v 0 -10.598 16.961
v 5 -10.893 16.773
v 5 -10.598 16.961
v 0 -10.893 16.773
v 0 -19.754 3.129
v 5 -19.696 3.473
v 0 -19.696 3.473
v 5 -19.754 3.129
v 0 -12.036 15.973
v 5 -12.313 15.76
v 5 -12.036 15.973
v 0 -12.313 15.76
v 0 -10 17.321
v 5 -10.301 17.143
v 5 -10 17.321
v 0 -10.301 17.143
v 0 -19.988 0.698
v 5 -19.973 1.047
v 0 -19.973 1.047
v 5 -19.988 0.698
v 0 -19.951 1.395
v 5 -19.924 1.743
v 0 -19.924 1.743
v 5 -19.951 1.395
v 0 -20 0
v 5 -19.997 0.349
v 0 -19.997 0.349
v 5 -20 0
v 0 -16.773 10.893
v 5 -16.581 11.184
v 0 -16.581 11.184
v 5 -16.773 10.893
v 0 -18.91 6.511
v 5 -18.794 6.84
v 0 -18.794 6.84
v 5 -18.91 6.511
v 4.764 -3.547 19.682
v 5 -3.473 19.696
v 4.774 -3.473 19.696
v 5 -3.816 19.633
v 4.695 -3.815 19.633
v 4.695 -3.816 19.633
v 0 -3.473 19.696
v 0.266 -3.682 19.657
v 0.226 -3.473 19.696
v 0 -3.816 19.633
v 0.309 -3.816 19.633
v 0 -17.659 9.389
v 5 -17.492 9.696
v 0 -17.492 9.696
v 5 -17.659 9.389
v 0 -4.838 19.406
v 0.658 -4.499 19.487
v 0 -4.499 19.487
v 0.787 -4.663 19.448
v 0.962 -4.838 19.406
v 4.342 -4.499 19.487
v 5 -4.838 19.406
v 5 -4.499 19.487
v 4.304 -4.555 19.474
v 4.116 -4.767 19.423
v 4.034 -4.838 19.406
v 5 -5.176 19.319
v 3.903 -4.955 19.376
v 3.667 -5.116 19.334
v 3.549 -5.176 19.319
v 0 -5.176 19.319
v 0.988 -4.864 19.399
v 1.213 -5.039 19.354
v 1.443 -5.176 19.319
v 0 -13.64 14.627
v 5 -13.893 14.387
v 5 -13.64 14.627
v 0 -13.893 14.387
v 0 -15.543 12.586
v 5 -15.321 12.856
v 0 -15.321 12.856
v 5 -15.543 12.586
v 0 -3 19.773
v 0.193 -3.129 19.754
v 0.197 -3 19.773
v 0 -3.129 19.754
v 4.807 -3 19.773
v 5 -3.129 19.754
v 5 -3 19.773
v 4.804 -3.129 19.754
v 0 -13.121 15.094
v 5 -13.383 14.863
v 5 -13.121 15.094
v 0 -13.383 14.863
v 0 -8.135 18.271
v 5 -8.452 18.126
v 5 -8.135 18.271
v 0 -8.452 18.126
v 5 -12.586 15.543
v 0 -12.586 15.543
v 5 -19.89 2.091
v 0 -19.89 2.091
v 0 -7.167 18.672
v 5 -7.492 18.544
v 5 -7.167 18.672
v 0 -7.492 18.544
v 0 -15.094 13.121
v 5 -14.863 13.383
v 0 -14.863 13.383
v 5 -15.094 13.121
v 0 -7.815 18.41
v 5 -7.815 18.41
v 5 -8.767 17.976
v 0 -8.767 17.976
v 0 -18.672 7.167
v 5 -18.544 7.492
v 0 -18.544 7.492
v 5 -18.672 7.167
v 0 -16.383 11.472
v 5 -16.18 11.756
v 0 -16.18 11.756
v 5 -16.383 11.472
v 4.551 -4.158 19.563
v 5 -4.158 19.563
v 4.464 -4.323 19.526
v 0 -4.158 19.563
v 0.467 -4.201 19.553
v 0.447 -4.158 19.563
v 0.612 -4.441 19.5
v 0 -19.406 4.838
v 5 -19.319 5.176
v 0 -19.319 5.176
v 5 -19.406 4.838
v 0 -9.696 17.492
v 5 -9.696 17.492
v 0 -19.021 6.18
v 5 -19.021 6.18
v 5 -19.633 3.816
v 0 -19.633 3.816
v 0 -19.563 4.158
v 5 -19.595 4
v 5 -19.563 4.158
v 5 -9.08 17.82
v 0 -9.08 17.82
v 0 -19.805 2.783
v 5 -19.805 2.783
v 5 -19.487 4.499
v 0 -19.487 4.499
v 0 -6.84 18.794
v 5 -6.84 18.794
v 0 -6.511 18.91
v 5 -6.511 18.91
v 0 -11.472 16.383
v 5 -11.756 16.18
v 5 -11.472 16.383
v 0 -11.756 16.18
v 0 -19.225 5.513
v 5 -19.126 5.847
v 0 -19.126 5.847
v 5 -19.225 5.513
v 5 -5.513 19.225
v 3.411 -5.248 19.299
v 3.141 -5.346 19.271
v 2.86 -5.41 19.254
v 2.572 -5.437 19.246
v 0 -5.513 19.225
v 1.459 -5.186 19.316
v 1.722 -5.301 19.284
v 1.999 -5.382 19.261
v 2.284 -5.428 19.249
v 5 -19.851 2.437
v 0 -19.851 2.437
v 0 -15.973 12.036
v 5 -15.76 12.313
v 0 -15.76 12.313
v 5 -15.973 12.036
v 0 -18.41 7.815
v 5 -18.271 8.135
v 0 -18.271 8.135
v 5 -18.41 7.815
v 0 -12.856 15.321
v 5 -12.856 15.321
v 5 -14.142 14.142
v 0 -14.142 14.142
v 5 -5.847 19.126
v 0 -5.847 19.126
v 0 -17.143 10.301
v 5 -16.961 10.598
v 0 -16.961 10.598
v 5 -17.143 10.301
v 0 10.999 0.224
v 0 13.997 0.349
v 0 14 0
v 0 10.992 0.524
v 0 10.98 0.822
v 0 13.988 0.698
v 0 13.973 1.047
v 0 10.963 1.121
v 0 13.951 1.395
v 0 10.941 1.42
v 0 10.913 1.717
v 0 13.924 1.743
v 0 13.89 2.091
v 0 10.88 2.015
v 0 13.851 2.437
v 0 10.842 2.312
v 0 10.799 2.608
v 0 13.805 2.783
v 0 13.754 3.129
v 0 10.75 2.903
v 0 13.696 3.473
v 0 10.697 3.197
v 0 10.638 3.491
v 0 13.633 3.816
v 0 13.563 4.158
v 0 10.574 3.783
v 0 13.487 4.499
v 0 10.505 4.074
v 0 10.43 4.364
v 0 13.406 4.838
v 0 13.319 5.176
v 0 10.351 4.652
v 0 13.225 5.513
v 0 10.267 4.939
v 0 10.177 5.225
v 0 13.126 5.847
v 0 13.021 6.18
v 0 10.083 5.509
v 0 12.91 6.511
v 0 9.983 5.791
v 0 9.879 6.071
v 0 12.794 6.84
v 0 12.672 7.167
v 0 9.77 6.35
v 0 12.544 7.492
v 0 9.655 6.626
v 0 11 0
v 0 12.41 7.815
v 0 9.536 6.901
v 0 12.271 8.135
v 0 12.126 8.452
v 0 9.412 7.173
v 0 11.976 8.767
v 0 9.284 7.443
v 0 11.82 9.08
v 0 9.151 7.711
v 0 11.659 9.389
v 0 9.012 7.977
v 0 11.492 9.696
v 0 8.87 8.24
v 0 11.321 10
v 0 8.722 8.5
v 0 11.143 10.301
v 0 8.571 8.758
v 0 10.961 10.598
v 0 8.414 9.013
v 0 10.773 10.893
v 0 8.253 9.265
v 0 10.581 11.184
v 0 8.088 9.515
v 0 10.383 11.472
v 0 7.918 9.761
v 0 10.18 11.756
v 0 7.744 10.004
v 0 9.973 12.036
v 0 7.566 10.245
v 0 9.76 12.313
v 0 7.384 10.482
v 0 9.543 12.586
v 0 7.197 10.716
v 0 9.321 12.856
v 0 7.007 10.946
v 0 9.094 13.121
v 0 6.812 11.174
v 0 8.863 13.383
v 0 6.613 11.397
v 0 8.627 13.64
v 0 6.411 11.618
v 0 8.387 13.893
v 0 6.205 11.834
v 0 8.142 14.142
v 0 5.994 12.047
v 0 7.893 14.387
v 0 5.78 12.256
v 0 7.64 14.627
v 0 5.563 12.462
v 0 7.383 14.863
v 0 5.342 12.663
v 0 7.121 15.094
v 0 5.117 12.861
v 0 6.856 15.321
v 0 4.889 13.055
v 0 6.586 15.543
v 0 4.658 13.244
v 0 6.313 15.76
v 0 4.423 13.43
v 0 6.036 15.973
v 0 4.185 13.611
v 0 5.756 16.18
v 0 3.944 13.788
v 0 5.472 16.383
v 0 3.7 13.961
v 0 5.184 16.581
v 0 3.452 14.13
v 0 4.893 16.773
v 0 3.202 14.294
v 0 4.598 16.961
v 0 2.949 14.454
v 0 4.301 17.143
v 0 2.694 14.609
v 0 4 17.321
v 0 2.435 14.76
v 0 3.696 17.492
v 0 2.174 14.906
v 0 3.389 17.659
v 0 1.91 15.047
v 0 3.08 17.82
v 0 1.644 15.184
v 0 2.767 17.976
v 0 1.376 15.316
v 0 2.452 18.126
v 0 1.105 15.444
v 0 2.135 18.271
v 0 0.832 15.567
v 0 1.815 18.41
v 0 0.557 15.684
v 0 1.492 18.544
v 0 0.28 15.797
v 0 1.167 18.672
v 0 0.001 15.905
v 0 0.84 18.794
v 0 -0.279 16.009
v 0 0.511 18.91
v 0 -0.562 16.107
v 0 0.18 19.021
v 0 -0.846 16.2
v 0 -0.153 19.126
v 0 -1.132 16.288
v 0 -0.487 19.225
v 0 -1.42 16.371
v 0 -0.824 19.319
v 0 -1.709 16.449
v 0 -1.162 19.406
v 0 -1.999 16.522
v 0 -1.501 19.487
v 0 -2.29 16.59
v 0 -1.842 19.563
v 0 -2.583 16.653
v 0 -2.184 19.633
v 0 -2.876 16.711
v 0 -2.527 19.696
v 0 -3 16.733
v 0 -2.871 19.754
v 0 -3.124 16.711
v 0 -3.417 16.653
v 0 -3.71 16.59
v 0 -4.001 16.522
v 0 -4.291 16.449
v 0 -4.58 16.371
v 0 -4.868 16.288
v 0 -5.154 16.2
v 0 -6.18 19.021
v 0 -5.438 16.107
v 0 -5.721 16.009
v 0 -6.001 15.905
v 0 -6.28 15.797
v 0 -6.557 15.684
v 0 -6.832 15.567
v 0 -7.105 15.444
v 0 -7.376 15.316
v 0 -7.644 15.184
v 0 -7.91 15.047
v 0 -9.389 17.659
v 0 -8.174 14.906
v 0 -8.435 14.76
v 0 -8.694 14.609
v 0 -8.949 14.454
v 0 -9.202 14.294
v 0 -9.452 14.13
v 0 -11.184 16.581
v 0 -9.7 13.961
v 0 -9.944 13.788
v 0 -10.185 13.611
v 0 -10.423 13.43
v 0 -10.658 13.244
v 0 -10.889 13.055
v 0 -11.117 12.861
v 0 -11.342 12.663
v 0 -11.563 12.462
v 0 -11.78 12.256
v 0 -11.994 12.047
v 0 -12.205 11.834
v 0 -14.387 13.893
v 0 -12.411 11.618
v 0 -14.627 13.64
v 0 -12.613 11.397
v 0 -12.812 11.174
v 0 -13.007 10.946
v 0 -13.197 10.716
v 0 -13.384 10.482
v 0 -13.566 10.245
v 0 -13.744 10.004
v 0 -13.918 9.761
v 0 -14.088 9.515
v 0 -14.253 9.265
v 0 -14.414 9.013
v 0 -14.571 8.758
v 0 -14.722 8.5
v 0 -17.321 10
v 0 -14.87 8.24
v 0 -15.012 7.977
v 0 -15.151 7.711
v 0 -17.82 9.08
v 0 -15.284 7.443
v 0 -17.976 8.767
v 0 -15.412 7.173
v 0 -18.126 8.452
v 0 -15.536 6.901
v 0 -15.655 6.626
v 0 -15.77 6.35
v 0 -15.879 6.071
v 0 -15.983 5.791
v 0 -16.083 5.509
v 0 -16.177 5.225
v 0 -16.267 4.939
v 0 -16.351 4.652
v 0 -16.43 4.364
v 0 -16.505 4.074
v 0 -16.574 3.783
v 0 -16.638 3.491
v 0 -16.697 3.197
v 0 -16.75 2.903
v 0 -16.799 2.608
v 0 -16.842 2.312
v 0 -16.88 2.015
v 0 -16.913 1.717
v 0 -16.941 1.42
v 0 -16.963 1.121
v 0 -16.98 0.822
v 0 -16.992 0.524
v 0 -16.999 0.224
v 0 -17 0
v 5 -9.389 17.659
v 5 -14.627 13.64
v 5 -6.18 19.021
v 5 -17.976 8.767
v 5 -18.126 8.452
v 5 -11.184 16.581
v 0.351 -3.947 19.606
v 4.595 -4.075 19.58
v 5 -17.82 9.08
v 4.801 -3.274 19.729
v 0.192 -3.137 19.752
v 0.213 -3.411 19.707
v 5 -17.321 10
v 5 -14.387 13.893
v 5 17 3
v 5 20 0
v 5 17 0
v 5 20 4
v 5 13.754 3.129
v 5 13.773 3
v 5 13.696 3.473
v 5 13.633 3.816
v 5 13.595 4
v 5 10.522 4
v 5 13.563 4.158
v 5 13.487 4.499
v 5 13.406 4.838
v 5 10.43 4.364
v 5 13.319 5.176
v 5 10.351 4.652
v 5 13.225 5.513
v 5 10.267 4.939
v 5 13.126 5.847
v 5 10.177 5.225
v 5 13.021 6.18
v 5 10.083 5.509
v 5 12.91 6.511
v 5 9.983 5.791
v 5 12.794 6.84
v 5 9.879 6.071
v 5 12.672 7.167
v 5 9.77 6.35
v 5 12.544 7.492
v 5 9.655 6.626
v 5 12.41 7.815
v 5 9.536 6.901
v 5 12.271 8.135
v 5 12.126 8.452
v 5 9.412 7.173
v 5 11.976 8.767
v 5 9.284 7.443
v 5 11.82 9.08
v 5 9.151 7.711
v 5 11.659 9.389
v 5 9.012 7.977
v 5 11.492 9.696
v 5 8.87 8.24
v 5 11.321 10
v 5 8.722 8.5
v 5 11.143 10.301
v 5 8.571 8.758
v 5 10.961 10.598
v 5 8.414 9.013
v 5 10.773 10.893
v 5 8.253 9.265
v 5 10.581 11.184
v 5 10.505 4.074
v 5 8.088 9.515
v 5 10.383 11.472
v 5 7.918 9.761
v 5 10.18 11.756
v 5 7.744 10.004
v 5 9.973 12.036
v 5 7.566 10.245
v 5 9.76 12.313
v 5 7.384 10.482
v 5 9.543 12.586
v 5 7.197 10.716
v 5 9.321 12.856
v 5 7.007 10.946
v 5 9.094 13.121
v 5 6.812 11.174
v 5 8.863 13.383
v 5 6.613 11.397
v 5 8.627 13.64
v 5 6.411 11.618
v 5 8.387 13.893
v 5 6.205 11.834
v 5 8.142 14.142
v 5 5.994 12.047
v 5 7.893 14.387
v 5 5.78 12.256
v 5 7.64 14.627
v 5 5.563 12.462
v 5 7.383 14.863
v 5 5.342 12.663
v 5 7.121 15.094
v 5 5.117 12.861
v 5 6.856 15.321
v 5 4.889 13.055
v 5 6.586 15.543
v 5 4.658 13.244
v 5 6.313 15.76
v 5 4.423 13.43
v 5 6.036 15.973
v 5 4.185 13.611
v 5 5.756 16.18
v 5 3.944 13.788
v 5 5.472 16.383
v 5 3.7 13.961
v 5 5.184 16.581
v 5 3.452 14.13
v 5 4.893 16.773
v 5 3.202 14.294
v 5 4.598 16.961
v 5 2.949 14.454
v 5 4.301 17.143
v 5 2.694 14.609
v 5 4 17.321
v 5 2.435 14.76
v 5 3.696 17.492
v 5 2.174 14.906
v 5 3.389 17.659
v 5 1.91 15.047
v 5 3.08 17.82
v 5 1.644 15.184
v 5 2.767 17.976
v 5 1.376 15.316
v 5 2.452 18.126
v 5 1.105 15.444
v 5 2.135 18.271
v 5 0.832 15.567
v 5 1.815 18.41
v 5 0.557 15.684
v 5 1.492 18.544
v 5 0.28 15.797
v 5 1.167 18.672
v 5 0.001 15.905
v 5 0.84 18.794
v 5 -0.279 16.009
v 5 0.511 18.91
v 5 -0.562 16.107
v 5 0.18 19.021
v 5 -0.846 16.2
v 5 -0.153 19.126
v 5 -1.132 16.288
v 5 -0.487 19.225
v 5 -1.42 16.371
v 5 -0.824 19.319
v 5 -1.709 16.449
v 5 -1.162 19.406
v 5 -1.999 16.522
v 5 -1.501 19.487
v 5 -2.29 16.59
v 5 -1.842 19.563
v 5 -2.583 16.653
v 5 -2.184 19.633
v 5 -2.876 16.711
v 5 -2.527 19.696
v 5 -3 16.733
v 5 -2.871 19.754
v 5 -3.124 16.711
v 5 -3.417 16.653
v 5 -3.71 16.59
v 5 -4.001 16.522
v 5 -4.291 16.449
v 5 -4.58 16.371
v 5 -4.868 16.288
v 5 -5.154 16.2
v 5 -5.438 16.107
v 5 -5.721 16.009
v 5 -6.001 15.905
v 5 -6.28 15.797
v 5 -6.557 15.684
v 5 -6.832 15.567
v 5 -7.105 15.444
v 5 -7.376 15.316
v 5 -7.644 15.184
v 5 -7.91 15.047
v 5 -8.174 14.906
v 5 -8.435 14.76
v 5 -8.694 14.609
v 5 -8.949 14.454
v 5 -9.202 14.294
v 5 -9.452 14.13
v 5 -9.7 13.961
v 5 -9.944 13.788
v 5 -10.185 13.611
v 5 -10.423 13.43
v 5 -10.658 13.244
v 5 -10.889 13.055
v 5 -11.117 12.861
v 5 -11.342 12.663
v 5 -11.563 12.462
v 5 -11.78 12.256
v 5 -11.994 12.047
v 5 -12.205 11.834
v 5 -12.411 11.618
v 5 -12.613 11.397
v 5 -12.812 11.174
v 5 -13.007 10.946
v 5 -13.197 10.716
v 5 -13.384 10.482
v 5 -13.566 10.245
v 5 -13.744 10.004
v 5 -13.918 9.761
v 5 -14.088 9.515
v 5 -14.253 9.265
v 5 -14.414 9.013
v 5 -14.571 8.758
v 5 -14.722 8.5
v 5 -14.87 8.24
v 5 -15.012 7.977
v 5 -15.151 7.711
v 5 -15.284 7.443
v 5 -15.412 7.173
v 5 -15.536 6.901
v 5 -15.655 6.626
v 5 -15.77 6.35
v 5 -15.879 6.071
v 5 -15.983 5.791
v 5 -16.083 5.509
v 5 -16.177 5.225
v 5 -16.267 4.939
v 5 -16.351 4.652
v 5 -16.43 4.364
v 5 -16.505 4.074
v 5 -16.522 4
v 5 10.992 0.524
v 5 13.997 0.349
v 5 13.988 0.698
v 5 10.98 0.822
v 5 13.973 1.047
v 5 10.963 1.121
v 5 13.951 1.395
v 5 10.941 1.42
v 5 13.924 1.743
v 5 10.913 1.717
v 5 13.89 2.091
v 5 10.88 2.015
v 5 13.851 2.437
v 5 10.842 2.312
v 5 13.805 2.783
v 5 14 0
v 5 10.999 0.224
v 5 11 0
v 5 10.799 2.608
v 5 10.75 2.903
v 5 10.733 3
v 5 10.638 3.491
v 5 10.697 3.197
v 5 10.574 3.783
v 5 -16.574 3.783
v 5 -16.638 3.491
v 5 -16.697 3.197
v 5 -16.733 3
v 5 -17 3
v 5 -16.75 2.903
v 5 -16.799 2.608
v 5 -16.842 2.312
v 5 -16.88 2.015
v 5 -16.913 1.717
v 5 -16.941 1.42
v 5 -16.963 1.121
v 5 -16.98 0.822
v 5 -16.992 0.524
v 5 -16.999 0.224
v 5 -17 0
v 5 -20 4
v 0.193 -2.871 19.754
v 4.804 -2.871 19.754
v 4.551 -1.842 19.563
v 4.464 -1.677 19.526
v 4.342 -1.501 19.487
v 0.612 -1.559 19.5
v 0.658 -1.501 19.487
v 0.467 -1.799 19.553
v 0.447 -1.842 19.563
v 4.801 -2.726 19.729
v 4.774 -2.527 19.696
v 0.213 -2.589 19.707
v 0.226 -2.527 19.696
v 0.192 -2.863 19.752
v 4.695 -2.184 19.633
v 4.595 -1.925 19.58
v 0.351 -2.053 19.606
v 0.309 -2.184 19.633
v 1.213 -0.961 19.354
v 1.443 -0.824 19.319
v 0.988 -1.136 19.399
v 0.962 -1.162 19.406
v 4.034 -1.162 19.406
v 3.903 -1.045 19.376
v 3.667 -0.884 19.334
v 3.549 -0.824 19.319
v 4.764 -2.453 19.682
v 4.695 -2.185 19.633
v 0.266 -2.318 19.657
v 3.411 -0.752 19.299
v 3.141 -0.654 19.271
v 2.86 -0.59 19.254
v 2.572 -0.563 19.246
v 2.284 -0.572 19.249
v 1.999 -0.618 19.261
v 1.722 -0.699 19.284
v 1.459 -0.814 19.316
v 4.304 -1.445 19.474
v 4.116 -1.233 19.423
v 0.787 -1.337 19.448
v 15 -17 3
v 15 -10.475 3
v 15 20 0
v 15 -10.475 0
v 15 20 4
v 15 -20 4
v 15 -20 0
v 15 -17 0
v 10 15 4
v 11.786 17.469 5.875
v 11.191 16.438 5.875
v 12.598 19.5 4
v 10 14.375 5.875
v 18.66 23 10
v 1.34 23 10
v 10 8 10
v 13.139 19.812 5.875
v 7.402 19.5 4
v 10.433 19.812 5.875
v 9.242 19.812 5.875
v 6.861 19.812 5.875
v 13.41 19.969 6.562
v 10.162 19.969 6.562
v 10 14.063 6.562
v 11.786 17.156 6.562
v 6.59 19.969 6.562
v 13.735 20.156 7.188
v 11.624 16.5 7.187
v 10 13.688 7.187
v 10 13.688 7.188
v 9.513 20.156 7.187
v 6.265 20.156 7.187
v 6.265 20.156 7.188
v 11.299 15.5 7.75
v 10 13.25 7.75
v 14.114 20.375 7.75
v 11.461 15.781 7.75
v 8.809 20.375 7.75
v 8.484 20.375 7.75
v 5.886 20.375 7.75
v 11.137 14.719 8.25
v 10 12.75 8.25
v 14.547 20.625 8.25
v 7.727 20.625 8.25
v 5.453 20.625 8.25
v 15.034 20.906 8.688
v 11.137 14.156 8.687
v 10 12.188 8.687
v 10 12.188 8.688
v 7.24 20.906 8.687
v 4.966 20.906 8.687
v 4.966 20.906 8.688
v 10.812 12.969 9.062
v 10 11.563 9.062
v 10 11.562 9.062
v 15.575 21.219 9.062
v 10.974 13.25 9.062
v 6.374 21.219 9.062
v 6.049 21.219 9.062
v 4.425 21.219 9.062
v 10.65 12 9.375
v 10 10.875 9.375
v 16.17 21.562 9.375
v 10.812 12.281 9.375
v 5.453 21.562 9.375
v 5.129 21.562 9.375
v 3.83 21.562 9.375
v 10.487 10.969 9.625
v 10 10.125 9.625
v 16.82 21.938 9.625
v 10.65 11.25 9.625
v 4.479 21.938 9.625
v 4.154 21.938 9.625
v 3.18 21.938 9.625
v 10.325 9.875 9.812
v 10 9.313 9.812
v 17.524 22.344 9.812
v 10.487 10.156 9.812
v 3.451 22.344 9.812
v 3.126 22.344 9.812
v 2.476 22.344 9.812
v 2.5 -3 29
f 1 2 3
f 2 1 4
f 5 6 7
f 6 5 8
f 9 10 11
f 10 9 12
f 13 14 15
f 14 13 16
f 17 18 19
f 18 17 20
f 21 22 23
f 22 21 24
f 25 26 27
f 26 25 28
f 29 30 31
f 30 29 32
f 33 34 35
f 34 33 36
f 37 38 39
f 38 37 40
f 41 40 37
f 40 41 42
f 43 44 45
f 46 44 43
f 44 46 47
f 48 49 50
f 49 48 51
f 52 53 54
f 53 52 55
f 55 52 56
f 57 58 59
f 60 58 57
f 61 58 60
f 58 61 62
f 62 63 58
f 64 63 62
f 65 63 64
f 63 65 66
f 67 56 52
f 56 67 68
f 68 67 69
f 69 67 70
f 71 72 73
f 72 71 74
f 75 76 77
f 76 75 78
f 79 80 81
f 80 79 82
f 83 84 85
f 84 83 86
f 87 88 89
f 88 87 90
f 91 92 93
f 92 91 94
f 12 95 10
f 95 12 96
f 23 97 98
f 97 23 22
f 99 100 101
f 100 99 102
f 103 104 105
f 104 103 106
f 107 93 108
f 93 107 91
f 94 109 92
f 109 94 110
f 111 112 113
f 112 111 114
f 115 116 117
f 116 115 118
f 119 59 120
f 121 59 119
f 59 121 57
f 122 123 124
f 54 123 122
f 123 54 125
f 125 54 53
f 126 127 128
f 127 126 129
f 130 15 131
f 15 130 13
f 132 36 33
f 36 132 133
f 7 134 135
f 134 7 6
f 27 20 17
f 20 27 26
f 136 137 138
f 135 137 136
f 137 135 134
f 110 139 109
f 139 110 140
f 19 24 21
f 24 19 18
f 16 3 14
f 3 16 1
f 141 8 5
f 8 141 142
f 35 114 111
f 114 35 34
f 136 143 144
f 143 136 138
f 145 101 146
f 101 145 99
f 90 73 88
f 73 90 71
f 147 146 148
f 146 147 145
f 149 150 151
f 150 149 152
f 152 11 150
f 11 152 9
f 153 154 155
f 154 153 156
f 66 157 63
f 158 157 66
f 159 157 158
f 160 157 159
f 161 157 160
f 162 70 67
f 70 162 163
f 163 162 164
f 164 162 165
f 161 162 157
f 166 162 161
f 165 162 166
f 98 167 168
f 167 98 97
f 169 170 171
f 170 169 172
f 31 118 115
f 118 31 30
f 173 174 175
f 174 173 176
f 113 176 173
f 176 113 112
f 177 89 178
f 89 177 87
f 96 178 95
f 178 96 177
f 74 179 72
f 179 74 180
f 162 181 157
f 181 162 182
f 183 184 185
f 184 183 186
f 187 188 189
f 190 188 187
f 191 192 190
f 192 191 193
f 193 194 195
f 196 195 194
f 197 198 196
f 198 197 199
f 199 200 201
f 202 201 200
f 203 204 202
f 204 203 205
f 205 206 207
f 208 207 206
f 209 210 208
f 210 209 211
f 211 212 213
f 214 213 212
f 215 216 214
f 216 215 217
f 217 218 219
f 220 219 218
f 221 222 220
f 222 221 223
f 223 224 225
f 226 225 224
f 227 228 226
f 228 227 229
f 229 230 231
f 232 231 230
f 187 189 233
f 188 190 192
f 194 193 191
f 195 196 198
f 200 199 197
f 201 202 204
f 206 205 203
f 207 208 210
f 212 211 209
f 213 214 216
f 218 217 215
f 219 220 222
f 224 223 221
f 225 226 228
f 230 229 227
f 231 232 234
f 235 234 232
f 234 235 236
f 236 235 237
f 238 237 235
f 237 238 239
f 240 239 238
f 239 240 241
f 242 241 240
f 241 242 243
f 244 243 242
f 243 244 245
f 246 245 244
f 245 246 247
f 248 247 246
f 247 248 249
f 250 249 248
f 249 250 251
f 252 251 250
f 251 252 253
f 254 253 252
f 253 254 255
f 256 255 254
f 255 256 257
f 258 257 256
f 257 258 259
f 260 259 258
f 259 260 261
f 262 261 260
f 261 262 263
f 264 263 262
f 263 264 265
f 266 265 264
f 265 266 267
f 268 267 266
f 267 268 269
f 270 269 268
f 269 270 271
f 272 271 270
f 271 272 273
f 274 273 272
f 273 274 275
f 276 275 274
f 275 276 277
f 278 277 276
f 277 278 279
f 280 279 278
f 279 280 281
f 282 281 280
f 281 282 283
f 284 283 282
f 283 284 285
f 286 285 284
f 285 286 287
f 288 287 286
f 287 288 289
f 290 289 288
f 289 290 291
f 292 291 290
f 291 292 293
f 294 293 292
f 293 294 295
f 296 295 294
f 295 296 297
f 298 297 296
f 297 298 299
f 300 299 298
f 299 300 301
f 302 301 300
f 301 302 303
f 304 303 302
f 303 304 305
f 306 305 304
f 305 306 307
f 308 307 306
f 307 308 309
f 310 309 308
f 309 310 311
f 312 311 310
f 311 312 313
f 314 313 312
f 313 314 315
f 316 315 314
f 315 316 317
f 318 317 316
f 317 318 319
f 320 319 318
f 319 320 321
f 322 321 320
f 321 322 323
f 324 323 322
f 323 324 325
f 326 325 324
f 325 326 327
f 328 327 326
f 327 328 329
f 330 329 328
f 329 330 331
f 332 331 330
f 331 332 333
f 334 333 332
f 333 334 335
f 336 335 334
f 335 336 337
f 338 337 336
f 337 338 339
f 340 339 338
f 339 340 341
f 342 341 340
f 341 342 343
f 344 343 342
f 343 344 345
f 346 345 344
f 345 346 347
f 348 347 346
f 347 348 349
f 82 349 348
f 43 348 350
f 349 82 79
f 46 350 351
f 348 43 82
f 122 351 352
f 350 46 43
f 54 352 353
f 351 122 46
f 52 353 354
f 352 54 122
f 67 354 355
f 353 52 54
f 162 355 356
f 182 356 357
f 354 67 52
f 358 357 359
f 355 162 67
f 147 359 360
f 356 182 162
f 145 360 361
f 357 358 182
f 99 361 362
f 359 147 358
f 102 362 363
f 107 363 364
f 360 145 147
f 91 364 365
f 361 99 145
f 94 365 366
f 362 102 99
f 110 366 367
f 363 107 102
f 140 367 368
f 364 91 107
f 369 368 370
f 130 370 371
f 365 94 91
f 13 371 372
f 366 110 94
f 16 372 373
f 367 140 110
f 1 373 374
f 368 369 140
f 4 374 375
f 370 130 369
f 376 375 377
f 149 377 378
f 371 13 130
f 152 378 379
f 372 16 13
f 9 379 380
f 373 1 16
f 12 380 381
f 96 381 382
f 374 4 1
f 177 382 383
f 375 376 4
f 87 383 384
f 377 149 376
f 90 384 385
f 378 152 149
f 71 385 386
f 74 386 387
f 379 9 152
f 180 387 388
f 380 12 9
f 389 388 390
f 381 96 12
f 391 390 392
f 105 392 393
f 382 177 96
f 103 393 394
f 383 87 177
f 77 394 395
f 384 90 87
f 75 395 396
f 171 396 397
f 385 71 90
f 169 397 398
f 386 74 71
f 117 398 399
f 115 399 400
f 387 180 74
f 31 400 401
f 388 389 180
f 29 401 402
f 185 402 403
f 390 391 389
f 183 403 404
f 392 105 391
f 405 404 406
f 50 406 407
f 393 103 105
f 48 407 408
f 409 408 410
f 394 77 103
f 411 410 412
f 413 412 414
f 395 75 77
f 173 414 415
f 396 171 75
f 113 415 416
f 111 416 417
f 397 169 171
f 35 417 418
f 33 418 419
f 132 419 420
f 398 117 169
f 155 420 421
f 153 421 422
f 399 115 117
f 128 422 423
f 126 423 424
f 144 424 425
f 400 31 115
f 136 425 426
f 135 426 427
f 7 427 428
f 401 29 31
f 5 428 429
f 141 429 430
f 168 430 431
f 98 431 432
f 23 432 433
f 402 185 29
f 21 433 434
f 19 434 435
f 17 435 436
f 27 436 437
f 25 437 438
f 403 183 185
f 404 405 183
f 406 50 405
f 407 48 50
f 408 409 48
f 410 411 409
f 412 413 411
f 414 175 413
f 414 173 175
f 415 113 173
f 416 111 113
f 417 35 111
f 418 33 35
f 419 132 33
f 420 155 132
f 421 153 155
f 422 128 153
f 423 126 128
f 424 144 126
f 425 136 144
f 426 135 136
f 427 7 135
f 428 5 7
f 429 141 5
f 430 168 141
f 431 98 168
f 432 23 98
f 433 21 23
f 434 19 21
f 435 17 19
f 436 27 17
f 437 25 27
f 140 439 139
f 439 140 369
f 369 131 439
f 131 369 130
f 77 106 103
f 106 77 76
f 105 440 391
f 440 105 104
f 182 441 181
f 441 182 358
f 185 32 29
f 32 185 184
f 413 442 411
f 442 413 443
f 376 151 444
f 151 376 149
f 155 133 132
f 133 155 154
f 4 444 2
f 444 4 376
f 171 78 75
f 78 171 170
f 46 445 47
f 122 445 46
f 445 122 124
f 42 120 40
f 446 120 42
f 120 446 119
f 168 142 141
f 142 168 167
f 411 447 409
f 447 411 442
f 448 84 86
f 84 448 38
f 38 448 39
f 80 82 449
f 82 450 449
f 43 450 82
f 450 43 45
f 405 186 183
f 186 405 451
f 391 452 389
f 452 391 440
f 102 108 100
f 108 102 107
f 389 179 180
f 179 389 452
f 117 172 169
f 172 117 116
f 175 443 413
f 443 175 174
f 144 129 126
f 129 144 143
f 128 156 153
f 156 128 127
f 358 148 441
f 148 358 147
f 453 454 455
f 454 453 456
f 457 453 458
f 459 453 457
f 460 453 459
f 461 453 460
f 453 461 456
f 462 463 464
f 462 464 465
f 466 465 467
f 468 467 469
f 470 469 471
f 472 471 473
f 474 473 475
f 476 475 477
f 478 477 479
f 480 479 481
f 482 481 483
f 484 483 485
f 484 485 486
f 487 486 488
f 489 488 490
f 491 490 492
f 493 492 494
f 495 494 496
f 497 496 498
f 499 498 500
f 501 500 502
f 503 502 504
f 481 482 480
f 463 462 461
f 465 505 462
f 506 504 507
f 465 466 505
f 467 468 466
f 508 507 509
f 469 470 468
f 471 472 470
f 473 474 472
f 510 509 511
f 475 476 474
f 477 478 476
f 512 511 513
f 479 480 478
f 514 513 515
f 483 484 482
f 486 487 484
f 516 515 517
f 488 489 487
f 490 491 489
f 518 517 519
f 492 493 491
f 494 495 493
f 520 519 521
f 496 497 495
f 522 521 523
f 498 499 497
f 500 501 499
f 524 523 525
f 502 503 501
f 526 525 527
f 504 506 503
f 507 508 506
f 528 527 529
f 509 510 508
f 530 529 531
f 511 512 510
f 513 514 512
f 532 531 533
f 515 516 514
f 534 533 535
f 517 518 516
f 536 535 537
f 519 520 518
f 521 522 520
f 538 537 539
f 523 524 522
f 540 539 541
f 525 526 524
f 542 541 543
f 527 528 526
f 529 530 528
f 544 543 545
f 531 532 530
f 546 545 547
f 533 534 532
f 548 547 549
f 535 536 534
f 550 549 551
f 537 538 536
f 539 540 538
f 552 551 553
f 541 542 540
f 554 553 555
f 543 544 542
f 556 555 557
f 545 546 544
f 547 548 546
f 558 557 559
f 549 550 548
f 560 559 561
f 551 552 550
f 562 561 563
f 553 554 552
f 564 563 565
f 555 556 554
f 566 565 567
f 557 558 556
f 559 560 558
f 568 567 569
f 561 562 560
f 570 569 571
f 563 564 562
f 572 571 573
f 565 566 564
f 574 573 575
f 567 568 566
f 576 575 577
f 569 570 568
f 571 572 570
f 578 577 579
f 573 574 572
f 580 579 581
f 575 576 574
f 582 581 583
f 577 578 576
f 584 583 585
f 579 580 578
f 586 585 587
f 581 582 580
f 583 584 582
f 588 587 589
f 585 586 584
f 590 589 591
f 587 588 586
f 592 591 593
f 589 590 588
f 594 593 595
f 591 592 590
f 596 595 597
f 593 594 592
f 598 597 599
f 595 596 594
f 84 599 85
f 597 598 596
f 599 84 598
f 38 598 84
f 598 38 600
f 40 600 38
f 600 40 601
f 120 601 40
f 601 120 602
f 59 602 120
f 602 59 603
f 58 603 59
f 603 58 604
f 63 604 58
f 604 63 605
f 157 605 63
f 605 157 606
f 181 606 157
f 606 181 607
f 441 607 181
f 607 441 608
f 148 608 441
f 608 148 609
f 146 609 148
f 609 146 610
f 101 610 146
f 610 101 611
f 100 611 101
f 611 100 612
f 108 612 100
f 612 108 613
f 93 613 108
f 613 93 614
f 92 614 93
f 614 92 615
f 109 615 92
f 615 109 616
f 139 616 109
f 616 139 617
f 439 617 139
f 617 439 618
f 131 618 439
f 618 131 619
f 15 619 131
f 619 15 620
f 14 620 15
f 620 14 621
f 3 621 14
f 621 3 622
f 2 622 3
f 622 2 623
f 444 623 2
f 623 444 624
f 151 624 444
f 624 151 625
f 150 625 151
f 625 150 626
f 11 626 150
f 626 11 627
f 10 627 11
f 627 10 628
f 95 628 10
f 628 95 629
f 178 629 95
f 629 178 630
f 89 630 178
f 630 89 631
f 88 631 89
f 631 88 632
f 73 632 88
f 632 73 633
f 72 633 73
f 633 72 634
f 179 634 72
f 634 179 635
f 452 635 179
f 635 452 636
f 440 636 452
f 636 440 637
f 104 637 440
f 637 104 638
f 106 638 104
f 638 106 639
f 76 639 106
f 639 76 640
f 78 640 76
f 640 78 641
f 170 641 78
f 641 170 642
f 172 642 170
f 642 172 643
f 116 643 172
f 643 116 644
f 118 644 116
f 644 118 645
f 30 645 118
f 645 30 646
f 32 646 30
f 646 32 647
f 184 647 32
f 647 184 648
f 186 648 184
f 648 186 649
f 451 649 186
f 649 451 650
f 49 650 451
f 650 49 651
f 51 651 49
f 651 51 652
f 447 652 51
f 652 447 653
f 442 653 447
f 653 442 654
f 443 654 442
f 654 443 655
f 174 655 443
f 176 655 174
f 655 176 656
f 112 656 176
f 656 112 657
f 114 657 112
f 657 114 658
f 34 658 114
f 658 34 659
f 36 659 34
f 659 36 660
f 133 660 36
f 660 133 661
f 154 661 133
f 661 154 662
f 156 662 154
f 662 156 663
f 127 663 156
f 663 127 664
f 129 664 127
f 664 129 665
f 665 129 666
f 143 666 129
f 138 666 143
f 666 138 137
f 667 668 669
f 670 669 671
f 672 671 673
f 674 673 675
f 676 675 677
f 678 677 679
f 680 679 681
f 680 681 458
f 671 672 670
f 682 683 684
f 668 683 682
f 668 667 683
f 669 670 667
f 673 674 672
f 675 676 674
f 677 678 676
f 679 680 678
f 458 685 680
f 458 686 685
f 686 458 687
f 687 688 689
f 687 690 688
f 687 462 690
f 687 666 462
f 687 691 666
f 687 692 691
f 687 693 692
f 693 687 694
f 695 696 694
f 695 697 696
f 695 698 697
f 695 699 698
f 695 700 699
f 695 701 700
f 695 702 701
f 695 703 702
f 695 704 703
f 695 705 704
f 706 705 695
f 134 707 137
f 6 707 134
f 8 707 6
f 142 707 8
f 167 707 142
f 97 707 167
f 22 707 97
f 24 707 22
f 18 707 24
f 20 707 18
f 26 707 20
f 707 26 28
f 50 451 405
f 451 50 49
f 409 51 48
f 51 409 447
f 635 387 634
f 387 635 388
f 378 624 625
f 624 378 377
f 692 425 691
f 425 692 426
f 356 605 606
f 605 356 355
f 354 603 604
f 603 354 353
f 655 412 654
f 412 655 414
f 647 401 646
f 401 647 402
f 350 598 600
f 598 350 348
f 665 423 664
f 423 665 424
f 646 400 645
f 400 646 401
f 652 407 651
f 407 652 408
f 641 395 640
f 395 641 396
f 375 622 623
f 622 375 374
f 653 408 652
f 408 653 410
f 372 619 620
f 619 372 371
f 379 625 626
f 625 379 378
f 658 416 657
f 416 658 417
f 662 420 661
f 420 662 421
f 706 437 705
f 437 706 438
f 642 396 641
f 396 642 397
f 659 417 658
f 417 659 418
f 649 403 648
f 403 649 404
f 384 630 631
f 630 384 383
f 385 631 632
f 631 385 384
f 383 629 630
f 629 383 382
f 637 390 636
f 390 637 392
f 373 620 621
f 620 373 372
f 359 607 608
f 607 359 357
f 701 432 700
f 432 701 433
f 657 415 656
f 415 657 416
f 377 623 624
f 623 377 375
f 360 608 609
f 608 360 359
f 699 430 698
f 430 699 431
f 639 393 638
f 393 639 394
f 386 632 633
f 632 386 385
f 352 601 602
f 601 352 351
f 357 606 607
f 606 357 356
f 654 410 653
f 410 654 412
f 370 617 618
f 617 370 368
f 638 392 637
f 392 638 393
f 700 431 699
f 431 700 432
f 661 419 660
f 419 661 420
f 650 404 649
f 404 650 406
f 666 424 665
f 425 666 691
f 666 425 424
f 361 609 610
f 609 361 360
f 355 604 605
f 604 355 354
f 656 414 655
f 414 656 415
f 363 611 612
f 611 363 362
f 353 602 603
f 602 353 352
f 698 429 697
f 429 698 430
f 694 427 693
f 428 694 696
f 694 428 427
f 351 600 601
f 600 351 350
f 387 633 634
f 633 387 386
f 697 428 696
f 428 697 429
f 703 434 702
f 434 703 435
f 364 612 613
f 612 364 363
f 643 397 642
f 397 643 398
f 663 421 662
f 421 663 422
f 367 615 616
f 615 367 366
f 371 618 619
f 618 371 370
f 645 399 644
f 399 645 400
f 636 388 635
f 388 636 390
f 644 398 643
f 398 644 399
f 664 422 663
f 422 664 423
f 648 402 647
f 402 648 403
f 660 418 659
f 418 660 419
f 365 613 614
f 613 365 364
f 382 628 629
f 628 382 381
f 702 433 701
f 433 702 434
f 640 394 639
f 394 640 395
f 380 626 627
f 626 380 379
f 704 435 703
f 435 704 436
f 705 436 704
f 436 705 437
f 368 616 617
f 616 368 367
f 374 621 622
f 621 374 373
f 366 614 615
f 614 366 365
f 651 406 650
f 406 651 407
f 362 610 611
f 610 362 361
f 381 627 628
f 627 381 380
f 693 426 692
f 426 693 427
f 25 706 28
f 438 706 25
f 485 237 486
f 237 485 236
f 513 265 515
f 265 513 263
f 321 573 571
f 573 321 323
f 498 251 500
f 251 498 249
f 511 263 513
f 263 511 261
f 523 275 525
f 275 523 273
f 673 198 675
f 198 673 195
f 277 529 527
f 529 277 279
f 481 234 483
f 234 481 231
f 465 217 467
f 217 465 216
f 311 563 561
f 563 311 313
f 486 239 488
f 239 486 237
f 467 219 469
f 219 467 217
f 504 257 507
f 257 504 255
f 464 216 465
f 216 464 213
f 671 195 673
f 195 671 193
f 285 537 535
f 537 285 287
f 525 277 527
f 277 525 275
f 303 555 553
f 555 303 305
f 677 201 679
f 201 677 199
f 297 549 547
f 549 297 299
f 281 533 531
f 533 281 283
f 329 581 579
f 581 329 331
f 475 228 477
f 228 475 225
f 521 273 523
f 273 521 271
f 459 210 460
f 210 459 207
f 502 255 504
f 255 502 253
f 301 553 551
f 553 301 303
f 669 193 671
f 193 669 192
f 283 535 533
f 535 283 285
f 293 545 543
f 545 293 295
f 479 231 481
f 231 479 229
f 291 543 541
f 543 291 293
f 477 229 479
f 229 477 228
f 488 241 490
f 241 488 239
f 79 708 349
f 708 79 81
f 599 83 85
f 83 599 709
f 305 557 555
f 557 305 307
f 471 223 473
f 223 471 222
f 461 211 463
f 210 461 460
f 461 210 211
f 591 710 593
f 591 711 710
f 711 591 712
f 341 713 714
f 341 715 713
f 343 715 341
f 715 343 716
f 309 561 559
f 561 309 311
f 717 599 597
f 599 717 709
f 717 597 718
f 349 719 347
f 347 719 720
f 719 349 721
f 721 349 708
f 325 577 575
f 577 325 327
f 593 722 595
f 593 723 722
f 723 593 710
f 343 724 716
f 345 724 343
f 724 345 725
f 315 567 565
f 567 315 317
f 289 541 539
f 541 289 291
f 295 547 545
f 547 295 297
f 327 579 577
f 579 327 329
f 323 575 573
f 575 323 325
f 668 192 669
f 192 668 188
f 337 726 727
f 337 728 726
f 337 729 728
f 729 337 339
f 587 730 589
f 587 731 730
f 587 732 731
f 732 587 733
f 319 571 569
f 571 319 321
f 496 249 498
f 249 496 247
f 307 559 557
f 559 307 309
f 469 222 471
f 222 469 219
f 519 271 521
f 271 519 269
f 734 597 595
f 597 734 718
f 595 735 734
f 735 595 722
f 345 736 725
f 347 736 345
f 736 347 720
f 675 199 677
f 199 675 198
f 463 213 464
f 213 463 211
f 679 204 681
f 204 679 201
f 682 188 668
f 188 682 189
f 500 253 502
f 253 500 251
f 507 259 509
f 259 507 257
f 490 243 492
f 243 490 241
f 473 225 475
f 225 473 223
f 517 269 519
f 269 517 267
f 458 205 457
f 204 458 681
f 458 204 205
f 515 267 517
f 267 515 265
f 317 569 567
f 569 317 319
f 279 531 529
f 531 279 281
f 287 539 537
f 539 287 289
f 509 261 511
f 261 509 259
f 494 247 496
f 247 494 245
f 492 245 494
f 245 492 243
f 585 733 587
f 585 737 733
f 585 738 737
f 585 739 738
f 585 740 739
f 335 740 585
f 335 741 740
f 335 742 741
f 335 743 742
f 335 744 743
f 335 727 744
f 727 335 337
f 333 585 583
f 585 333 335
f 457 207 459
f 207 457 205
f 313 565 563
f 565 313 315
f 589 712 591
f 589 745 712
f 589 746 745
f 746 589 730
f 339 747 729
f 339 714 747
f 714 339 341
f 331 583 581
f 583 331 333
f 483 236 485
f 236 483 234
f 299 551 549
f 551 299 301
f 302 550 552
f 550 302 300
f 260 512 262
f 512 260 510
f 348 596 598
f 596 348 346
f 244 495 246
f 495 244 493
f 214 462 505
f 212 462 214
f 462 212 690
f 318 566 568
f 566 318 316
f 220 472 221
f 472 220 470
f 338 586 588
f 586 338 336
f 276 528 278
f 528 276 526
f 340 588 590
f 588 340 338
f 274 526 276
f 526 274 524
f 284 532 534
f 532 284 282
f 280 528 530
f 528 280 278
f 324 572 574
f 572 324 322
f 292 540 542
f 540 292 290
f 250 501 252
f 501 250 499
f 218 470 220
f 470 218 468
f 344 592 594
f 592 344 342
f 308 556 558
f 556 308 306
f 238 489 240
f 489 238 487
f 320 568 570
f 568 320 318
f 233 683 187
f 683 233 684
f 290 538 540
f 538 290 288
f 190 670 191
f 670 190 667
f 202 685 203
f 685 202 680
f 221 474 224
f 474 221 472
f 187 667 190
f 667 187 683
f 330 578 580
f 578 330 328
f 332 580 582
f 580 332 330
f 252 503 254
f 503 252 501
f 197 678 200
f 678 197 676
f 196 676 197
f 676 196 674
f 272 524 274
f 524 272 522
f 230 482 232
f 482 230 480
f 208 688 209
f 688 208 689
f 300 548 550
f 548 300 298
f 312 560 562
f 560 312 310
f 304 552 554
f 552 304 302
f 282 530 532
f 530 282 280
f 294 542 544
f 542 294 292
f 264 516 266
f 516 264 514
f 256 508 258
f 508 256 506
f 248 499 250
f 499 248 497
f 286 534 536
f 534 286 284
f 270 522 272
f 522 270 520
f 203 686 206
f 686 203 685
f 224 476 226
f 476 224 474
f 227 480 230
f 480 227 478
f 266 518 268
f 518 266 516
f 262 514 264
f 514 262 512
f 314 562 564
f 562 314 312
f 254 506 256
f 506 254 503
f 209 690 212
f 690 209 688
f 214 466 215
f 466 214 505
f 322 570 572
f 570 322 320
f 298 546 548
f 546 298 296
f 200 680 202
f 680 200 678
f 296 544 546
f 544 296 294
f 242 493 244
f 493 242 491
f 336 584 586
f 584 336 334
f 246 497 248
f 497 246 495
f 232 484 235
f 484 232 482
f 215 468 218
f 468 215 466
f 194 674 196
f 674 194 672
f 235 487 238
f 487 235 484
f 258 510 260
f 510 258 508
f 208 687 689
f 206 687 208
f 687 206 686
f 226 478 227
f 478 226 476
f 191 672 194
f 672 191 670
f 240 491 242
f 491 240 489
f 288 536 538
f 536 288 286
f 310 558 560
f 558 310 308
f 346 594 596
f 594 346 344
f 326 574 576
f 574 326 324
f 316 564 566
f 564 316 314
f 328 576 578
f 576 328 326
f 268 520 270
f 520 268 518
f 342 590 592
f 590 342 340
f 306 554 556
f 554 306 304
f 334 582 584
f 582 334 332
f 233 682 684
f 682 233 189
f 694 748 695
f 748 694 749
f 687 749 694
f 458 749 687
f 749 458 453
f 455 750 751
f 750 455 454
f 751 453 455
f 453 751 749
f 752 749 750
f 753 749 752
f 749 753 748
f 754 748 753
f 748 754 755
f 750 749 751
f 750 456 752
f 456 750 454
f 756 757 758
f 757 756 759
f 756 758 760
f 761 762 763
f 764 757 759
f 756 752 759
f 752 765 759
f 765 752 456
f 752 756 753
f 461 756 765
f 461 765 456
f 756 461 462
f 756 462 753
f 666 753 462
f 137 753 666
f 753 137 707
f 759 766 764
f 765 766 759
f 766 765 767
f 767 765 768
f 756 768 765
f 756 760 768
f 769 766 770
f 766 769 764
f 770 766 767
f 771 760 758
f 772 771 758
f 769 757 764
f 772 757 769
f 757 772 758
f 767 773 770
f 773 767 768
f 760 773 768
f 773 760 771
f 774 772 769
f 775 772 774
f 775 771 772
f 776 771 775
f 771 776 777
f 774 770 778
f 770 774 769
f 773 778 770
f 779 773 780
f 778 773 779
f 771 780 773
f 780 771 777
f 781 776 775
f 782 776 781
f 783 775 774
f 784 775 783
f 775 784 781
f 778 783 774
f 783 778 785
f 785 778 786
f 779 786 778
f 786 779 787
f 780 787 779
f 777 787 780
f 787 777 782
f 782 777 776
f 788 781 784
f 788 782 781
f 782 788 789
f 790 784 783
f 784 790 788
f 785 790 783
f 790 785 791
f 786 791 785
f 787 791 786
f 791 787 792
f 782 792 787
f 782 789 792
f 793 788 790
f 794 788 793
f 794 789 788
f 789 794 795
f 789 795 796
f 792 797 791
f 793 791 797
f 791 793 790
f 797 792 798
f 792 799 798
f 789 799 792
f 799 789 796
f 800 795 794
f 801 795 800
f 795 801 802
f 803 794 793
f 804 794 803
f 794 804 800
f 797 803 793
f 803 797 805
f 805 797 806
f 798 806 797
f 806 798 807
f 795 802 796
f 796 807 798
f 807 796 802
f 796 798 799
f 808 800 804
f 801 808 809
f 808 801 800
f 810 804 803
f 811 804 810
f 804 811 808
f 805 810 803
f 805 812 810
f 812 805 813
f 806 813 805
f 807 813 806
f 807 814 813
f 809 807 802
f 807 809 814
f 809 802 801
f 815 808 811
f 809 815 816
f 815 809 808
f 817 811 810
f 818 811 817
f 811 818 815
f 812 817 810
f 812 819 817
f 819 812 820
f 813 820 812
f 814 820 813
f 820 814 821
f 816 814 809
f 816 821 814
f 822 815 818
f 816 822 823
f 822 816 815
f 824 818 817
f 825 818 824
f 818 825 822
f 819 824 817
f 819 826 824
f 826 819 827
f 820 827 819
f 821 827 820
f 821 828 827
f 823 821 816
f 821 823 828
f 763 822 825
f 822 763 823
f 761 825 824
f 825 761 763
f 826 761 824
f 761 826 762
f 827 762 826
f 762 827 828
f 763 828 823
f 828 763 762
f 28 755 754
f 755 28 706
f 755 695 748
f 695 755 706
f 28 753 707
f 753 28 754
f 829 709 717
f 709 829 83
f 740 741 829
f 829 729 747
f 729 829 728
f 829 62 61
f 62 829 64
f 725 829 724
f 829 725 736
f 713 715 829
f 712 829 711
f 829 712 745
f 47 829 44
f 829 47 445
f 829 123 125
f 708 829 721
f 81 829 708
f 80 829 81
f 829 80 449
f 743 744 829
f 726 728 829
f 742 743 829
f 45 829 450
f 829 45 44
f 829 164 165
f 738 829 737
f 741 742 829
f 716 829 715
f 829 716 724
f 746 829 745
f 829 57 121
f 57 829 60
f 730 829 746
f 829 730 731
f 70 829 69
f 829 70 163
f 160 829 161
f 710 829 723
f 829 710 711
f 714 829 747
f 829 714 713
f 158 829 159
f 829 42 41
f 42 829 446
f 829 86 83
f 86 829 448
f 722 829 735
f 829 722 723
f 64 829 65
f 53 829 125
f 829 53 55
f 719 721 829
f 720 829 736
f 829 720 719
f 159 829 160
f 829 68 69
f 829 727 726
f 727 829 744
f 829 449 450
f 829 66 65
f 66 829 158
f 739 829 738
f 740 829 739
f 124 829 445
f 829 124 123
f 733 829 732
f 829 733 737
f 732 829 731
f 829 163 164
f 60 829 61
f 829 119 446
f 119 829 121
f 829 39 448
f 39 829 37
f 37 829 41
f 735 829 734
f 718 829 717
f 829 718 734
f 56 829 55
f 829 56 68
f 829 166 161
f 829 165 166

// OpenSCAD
$fs = 0.3;
$fa = 1;

module arc() {
	rotate([0, 90, 0]) {
		difference() {
			cylinder(r=20, h=5);
			cylinder(r=17, h=6);
			translate([0, -21, 0]) {
				cube([21, 42, 6]);
			}
		}
	}
}

middle_remove = 3;
intersection() {
	arc();
	translate([0, -20, 0]) {
		cube([5, 20 - middle_remove, 20]);
	}
}
translate([0, -middle_remove * 2, 0]) {
	intersection() {
		arc();
		translate([0, middle_remove, 0]) {
			cube([5, 20 - middle_remove, 20]);
		}
	}
}

translate([5, -20, 0]) {
	cube([10, 3, 3]);
}
translate([5, 17, 0]) {
	cube([10, 3, 3]);
}
intersection() {
	translate([5, 17, 0]) {
		rotate([0, 0, -70]) {
			cube([40, 40, 3]);
		}
	}
	translate([5, -20, 0]) {
		cube([10, 40, 3]);
	}
}
translate([5, -20, 3]) {
	cube([10, 40, 1]);
}
translate([10, 18, 4]) {
	rotate([0, 0, 30]) {
		for(i = [0:10]) {
			translate([0, 0, i/2]) {
				cylinder($fn=3, r1=3, r2=5 + i / 2, h=6 - i / 2);
			}
		}
	}
}
translate([2.5, -middle_remove, 19]) {
	cylinder(r1=2.5, r2=0, h=10);
}
